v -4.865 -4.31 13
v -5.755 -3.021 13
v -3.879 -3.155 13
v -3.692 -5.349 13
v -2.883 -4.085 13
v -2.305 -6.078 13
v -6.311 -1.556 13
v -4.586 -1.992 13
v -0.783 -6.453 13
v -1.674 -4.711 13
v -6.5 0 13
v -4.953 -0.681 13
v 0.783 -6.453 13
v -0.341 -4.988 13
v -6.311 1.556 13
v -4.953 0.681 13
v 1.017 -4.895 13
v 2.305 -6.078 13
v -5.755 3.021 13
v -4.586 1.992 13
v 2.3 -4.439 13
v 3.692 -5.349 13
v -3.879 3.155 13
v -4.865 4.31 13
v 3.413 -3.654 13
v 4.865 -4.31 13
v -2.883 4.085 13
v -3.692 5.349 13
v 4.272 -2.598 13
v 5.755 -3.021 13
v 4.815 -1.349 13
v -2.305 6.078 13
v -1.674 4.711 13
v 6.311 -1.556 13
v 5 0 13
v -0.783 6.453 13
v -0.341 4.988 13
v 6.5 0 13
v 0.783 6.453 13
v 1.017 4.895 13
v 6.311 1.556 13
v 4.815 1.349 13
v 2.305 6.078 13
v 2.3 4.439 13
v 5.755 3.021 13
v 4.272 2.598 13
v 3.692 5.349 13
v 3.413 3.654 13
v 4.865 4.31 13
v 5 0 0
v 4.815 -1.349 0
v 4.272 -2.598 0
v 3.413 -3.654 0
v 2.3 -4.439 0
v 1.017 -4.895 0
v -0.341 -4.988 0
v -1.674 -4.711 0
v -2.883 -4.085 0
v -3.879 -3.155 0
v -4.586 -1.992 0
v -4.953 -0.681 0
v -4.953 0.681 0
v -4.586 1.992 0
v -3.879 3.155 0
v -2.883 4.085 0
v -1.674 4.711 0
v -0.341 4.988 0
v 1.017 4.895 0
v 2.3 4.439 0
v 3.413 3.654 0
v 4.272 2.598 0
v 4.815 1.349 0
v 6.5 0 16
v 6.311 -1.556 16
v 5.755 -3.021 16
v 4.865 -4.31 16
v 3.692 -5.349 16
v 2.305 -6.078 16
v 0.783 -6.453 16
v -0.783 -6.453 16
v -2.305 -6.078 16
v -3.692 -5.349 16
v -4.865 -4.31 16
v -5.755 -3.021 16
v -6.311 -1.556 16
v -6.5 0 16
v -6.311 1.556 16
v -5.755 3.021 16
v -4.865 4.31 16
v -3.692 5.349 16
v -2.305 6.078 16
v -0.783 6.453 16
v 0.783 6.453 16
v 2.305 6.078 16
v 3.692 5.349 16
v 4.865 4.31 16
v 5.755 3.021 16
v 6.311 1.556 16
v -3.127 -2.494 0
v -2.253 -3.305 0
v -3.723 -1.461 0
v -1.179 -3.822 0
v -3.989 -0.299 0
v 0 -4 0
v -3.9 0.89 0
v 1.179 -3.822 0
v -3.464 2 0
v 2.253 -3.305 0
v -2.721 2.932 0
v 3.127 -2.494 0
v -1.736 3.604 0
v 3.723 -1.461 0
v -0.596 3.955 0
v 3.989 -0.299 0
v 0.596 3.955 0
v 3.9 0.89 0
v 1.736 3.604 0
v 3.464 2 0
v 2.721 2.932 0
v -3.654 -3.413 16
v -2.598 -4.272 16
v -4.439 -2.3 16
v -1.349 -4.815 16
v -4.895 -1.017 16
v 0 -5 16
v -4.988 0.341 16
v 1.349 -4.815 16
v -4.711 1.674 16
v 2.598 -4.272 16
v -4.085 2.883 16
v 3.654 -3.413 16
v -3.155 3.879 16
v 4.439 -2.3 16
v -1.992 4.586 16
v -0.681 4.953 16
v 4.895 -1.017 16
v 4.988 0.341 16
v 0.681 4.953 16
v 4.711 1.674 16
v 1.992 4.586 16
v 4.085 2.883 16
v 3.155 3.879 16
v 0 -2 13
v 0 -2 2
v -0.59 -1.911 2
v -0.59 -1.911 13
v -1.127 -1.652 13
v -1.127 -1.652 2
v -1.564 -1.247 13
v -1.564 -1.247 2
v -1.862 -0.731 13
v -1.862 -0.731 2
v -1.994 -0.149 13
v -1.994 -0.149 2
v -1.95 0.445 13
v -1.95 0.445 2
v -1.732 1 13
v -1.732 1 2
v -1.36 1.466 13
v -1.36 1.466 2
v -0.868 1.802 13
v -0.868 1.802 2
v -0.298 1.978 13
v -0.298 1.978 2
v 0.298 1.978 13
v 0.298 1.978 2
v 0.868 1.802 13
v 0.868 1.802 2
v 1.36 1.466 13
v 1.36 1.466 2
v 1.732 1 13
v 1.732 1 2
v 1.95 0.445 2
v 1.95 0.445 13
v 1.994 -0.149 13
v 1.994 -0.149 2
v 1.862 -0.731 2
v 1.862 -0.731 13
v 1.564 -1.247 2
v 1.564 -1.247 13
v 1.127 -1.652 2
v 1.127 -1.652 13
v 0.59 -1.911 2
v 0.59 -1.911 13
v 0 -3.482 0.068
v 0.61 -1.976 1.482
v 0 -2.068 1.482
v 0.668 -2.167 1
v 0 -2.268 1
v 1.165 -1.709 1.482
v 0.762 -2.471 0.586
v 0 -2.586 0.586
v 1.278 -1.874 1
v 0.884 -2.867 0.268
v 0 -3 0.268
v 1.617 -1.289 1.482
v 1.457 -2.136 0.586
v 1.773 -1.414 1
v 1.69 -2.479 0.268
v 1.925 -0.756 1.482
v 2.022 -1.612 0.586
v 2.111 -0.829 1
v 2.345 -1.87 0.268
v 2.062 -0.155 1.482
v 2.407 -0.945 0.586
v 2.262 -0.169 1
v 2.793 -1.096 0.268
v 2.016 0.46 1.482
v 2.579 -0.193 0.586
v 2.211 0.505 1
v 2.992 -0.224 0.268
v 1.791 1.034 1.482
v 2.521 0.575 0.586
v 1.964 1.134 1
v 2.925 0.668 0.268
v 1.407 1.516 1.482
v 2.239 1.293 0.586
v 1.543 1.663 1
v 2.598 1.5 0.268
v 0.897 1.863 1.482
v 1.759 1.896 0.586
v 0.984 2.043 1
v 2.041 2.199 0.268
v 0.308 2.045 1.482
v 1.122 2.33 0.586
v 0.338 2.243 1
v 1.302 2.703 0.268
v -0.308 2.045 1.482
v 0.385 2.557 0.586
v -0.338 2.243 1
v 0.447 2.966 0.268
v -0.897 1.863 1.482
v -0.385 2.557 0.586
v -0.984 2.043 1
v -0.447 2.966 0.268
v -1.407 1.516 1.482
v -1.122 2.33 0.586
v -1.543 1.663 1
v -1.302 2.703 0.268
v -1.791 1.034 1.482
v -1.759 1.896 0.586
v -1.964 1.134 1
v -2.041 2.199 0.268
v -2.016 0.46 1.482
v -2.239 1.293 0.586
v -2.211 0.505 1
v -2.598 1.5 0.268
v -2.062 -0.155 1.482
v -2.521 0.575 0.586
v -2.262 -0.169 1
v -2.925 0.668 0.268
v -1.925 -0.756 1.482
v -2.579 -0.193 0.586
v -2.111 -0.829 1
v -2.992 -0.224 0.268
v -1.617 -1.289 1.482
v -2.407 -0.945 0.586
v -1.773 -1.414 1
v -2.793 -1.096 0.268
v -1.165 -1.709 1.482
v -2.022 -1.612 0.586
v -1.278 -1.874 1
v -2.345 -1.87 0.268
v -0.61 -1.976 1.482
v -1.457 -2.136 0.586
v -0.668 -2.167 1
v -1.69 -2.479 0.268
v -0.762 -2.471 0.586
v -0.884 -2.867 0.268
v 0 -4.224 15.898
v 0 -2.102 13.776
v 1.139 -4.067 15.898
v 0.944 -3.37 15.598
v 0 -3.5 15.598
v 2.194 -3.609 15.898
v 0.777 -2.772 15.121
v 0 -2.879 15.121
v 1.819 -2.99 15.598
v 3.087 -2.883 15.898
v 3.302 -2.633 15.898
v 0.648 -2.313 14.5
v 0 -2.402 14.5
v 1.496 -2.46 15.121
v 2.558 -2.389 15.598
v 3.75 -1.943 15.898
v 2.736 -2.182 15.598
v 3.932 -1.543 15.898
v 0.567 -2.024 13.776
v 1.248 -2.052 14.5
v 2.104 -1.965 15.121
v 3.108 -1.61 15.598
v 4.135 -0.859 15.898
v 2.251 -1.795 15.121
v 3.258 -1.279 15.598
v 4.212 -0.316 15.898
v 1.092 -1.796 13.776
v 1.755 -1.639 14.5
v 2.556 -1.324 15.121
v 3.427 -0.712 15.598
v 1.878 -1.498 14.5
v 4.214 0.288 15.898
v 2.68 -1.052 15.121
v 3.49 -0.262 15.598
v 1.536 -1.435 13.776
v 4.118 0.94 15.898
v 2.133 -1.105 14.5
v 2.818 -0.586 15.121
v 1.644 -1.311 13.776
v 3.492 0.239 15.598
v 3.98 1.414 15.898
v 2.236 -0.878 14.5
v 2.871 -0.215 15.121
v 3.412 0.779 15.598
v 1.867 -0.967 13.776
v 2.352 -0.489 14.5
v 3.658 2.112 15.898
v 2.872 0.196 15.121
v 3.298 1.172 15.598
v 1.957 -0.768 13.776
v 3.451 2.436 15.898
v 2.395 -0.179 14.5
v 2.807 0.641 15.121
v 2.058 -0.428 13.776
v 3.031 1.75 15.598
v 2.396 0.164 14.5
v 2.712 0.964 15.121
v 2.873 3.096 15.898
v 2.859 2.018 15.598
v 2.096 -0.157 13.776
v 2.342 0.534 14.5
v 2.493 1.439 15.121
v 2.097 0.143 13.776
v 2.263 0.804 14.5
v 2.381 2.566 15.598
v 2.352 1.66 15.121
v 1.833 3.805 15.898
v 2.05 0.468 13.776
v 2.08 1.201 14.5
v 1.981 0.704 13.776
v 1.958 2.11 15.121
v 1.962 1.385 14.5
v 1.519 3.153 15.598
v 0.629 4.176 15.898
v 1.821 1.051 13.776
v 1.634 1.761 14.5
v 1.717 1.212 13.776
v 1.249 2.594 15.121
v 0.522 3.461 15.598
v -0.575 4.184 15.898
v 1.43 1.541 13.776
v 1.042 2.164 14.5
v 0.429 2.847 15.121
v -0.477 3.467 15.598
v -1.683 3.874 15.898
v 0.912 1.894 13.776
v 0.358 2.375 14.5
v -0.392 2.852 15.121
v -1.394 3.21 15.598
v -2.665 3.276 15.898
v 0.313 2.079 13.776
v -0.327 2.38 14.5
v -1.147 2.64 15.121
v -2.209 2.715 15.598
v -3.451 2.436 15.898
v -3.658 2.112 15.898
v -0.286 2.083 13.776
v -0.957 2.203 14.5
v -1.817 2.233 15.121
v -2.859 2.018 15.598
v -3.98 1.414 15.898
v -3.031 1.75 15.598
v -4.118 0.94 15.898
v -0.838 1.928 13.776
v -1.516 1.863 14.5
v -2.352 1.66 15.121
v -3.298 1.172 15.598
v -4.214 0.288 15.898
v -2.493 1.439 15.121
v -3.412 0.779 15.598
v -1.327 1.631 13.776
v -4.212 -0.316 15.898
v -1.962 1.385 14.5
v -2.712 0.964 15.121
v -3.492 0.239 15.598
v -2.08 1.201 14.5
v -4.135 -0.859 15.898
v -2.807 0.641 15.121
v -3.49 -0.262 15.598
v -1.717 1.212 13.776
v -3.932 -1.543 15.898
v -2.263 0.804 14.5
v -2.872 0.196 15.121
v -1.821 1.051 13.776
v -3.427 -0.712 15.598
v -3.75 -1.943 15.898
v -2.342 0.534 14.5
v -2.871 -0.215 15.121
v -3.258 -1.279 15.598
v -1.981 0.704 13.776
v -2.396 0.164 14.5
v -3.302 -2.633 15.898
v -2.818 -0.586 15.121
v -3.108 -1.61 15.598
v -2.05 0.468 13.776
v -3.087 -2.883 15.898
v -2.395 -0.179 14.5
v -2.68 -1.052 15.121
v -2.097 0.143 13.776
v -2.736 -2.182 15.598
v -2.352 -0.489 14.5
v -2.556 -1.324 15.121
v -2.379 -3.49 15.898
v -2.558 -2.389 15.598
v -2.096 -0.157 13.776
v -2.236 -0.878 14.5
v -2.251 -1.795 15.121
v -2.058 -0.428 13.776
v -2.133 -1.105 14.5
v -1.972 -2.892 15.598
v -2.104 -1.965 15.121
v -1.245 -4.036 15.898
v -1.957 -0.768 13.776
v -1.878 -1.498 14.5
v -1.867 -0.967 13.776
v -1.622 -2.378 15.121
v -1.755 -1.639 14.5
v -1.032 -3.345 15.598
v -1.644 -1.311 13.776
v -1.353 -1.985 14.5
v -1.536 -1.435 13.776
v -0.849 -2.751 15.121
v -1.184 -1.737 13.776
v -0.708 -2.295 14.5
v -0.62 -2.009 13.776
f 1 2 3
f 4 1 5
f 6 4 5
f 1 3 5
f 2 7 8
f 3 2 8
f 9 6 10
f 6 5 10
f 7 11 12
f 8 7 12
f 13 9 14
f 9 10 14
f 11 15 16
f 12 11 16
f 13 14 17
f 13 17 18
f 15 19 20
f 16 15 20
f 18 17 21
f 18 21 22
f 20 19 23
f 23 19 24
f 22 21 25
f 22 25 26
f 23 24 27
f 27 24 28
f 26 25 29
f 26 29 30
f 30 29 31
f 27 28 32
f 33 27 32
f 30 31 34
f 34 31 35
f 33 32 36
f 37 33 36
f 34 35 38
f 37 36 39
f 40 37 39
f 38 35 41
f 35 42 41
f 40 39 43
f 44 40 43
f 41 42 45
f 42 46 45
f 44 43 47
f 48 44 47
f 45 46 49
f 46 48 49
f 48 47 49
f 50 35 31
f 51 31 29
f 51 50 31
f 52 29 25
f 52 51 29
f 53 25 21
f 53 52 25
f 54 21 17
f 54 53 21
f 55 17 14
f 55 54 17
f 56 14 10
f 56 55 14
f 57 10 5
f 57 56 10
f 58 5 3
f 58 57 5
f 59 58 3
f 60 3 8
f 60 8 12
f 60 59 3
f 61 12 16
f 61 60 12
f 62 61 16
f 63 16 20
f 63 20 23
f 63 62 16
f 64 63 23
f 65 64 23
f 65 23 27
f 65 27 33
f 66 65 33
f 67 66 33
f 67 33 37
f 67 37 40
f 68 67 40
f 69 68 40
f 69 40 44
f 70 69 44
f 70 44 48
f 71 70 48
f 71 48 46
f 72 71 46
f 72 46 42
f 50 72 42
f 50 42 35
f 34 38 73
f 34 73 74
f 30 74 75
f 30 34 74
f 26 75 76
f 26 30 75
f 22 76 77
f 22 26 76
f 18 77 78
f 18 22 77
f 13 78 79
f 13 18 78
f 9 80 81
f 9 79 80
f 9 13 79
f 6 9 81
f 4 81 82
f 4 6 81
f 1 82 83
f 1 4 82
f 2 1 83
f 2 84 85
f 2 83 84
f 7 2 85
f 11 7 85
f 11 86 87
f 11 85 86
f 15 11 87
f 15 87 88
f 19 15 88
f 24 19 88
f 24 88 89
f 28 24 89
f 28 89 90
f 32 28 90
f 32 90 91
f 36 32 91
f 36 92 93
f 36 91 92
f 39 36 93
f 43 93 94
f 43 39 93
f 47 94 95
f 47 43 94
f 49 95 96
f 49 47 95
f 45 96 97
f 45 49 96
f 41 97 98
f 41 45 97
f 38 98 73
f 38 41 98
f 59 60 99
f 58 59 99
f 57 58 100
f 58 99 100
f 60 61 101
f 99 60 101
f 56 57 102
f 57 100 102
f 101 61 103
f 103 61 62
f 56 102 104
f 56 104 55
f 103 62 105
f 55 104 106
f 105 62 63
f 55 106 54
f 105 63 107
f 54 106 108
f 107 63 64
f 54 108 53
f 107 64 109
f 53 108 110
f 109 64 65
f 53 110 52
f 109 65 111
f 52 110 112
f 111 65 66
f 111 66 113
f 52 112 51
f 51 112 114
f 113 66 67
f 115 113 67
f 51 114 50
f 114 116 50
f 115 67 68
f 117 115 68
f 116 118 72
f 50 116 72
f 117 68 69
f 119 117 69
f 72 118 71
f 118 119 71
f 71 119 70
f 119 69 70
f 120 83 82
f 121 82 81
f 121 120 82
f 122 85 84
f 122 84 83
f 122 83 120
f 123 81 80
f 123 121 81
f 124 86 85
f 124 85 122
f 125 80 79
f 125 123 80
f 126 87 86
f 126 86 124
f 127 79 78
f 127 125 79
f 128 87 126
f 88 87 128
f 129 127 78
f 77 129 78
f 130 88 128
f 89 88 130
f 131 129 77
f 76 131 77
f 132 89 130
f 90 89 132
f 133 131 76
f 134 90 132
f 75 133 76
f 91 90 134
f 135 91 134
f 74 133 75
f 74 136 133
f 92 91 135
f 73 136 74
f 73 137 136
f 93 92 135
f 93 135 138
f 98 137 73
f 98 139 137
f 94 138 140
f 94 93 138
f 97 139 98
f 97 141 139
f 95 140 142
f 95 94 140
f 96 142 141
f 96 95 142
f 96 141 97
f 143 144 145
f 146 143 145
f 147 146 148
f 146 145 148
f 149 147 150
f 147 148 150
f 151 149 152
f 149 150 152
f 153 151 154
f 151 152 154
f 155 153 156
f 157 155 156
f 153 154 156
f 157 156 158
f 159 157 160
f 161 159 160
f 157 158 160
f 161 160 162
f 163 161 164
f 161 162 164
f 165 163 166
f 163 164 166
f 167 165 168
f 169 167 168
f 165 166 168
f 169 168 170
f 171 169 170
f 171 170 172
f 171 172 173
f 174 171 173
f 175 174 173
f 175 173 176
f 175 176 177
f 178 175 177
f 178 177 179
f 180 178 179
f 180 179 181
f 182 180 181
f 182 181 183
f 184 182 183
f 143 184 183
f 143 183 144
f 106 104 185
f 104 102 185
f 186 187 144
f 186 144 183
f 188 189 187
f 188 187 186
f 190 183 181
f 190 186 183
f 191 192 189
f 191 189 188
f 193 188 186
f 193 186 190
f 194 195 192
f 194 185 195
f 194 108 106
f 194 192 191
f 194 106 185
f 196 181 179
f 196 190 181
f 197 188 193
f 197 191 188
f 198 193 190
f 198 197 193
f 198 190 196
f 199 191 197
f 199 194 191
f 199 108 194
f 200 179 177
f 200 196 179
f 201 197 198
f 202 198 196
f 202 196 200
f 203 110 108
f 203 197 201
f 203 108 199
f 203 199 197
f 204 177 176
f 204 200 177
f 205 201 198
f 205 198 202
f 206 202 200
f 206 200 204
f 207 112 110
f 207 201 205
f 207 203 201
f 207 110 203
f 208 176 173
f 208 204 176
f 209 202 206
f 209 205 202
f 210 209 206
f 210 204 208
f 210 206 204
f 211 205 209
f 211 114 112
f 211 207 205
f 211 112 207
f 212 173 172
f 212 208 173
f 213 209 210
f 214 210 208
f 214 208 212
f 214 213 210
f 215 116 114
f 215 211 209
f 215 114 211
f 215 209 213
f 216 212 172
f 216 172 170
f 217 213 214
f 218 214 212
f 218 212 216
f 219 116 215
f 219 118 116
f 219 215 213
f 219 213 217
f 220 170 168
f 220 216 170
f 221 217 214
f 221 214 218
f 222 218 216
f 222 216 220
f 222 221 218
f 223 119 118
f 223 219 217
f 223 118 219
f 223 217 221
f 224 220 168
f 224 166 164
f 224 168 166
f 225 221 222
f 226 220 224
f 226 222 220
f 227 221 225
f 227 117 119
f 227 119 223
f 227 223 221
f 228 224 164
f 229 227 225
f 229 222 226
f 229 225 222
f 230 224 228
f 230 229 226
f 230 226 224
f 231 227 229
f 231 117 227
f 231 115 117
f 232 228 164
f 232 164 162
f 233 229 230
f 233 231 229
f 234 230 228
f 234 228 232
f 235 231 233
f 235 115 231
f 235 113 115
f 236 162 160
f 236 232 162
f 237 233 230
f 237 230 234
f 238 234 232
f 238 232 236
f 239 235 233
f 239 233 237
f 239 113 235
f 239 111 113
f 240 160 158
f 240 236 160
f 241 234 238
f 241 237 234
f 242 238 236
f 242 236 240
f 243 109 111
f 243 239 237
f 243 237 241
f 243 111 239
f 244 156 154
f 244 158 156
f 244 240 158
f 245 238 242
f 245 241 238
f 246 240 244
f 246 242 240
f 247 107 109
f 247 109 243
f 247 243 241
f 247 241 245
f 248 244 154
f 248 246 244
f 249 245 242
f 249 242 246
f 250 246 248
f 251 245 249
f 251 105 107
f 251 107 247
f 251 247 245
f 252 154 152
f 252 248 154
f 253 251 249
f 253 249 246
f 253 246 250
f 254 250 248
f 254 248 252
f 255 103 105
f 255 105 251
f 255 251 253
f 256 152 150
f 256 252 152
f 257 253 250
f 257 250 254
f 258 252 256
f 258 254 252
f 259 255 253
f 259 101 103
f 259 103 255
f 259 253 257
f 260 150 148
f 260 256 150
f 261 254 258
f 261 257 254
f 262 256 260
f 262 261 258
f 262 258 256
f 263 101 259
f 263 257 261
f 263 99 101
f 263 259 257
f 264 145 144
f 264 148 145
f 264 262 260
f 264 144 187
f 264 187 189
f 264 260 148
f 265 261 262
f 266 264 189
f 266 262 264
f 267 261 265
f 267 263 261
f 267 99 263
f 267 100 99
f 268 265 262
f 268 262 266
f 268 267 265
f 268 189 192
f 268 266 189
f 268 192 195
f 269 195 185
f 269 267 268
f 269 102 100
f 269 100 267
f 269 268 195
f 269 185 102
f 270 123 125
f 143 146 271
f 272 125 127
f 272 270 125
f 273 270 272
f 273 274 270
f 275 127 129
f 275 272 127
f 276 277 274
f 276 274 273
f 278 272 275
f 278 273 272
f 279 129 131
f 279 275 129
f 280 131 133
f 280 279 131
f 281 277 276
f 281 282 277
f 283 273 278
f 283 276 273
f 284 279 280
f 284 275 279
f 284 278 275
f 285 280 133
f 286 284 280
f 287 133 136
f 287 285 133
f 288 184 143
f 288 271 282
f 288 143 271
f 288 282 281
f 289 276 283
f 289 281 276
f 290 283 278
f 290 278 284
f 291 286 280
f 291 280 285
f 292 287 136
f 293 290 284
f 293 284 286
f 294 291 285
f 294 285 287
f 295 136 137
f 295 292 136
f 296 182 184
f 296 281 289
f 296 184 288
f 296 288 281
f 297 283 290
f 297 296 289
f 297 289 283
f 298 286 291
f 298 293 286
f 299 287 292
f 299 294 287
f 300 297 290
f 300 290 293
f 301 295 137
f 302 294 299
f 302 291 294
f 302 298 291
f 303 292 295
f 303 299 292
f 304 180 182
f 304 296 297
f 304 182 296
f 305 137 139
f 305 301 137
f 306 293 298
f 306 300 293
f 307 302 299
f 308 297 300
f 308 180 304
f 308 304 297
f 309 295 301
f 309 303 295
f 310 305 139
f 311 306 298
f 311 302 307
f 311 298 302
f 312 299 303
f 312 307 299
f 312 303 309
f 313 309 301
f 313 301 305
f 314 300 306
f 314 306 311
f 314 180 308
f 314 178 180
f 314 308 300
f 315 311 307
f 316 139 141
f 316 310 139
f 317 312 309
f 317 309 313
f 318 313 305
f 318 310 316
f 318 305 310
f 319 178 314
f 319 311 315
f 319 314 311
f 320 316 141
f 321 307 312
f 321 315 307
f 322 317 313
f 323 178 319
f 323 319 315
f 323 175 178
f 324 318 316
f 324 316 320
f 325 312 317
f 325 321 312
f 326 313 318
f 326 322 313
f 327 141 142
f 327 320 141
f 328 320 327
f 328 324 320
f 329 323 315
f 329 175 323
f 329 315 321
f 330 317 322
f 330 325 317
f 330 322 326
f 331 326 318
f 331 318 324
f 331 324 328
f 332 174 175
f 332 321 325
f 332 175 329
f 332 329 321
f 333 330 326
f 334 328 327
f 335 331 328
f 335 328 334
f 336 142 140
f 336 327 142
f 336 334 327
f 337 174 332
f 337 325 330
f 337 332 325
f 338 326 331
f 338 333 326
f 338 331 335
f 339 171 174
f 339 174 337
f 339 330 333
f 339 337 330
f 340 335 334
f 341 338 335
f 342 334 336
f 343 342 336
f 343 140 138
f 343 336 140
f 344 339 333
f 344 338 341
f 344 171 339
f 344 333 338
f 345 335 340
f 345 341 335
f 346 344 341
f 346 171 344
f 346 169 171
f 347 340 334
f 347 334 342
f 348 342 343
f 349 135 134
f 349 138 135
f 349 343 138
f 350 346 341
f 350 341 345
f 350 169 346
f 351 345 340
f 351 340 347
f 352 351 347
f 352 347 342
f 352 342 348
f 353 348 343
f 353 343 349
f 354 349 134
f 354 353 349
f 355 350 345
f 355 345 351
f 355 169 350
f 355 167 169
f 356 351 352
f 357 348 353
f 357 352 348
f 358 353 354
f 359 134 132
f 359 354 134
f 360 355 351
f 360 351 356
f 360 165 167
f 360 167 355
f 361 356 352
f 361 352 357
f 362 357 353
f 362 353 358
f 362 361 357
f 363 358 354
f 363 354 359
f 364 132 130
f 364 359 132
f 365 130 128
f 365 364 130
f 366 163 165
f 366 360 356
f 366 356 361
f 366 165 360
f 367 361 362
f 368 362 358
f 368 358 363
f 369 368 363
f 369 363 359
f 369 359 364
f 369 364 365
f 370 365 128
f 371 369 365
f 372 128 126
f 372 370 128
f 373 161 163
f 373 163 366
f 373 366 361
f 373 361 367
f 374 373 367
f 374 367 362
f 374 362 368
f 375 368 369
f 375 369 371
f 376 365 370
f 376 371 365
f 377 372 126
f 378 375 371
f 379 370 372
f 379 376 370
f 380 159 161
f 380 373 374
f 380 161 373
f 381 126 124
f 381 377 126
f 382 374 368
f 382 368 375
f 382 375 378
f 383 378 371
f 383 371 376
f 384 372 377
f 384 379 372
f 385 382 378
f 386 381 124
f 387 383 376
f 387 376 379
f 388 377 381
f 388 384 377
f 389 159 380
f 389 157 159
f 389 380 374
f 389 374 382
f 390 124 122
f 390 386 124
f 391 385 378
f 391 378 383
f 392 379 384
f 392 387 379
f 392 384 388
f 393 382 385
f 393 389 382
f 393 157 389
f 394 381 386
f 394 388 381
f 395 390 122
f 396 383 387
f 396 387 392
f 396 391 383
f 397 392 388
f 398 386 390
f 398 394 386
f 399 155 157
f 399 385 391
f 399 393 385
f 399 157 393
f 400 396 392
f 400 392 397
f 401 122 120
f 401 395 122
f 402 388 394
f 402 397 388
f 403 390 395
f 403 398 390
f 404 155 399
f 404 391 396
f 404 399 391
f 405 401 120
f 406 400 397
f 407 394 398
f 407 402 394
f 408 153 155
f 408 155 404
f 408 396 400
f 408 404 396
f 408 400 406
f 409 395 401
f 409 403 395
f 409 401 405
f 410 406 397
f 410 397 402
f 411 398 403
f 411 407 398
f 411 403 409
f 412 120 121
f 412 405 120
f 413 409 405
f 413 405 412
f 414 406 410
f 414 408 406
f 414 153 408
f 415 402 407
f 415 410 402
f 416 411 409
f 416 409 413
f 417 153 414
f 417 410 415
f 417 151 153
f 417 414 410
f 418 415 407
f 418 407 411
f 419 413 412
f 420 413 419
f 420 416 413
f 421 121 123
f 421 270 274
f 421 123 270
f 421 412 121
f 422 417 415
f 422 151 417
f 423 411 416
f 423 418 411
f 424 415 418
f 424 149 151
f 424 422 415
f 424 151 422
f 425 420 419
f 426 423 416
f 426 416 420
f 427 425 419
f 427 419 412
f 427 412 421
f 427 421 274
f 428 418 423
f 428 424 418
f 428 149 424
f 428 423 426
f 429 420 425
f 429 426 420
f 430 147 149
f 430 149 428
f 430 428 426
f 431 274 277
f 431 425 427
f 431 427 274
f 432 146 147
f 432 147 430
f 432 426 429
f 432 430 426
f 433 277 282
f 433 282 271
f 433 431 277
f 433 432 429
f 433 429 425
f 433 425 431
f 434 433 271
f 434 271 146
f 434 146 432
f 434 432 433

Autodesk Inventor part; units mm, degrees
ref_plane "YZ Plane" through (0, 0, 0) normal (1, 0, 0) x (0, 1, 0)
ref_plane "XZ Plane" through (0, 0, 0) normal (0, 1, 0) x (-1, 0, 0)
ref_plane "XY Plane" through (0, 0, 0) normal (0, 0, 1) x (1, 0, 0)
sketch "Sketch1" plane through (0, 0, 0) normal (0, 0, 1) x (1, 0, 0)
  line L0 (-6, 0) -> (8, 0) projected
  line L1 (0, 8) -> (0, -6) projected
  circle A0 centre (0, 0) radius 5
  dimension "d0" = 10
extrude "Extrusion1" add sketch "Sketch1" along normal blind 13
sketch "Sketch2" plane through (0, 0, 13) normal (0, 0, 1) x (1, 0, 0)
  circle A0 centre (0, 0) radius 5 construction
  circle A1 centre (0, 0) radius 6.5
  dimension "d3" = 13
extrude "Extrusion2" add sketch "Sketch2" along normal blind 3
hole "Hole1" at (0, 0, 16) direction (0, 0, -1) diameter 4 end through all
fillet "Fillet1" radius 3 1 edges at (0, 2, 16)
fillet "Fillet2" radius 2 1 edges at (0, 2, 0)
properties part number "Bushing Drill"
